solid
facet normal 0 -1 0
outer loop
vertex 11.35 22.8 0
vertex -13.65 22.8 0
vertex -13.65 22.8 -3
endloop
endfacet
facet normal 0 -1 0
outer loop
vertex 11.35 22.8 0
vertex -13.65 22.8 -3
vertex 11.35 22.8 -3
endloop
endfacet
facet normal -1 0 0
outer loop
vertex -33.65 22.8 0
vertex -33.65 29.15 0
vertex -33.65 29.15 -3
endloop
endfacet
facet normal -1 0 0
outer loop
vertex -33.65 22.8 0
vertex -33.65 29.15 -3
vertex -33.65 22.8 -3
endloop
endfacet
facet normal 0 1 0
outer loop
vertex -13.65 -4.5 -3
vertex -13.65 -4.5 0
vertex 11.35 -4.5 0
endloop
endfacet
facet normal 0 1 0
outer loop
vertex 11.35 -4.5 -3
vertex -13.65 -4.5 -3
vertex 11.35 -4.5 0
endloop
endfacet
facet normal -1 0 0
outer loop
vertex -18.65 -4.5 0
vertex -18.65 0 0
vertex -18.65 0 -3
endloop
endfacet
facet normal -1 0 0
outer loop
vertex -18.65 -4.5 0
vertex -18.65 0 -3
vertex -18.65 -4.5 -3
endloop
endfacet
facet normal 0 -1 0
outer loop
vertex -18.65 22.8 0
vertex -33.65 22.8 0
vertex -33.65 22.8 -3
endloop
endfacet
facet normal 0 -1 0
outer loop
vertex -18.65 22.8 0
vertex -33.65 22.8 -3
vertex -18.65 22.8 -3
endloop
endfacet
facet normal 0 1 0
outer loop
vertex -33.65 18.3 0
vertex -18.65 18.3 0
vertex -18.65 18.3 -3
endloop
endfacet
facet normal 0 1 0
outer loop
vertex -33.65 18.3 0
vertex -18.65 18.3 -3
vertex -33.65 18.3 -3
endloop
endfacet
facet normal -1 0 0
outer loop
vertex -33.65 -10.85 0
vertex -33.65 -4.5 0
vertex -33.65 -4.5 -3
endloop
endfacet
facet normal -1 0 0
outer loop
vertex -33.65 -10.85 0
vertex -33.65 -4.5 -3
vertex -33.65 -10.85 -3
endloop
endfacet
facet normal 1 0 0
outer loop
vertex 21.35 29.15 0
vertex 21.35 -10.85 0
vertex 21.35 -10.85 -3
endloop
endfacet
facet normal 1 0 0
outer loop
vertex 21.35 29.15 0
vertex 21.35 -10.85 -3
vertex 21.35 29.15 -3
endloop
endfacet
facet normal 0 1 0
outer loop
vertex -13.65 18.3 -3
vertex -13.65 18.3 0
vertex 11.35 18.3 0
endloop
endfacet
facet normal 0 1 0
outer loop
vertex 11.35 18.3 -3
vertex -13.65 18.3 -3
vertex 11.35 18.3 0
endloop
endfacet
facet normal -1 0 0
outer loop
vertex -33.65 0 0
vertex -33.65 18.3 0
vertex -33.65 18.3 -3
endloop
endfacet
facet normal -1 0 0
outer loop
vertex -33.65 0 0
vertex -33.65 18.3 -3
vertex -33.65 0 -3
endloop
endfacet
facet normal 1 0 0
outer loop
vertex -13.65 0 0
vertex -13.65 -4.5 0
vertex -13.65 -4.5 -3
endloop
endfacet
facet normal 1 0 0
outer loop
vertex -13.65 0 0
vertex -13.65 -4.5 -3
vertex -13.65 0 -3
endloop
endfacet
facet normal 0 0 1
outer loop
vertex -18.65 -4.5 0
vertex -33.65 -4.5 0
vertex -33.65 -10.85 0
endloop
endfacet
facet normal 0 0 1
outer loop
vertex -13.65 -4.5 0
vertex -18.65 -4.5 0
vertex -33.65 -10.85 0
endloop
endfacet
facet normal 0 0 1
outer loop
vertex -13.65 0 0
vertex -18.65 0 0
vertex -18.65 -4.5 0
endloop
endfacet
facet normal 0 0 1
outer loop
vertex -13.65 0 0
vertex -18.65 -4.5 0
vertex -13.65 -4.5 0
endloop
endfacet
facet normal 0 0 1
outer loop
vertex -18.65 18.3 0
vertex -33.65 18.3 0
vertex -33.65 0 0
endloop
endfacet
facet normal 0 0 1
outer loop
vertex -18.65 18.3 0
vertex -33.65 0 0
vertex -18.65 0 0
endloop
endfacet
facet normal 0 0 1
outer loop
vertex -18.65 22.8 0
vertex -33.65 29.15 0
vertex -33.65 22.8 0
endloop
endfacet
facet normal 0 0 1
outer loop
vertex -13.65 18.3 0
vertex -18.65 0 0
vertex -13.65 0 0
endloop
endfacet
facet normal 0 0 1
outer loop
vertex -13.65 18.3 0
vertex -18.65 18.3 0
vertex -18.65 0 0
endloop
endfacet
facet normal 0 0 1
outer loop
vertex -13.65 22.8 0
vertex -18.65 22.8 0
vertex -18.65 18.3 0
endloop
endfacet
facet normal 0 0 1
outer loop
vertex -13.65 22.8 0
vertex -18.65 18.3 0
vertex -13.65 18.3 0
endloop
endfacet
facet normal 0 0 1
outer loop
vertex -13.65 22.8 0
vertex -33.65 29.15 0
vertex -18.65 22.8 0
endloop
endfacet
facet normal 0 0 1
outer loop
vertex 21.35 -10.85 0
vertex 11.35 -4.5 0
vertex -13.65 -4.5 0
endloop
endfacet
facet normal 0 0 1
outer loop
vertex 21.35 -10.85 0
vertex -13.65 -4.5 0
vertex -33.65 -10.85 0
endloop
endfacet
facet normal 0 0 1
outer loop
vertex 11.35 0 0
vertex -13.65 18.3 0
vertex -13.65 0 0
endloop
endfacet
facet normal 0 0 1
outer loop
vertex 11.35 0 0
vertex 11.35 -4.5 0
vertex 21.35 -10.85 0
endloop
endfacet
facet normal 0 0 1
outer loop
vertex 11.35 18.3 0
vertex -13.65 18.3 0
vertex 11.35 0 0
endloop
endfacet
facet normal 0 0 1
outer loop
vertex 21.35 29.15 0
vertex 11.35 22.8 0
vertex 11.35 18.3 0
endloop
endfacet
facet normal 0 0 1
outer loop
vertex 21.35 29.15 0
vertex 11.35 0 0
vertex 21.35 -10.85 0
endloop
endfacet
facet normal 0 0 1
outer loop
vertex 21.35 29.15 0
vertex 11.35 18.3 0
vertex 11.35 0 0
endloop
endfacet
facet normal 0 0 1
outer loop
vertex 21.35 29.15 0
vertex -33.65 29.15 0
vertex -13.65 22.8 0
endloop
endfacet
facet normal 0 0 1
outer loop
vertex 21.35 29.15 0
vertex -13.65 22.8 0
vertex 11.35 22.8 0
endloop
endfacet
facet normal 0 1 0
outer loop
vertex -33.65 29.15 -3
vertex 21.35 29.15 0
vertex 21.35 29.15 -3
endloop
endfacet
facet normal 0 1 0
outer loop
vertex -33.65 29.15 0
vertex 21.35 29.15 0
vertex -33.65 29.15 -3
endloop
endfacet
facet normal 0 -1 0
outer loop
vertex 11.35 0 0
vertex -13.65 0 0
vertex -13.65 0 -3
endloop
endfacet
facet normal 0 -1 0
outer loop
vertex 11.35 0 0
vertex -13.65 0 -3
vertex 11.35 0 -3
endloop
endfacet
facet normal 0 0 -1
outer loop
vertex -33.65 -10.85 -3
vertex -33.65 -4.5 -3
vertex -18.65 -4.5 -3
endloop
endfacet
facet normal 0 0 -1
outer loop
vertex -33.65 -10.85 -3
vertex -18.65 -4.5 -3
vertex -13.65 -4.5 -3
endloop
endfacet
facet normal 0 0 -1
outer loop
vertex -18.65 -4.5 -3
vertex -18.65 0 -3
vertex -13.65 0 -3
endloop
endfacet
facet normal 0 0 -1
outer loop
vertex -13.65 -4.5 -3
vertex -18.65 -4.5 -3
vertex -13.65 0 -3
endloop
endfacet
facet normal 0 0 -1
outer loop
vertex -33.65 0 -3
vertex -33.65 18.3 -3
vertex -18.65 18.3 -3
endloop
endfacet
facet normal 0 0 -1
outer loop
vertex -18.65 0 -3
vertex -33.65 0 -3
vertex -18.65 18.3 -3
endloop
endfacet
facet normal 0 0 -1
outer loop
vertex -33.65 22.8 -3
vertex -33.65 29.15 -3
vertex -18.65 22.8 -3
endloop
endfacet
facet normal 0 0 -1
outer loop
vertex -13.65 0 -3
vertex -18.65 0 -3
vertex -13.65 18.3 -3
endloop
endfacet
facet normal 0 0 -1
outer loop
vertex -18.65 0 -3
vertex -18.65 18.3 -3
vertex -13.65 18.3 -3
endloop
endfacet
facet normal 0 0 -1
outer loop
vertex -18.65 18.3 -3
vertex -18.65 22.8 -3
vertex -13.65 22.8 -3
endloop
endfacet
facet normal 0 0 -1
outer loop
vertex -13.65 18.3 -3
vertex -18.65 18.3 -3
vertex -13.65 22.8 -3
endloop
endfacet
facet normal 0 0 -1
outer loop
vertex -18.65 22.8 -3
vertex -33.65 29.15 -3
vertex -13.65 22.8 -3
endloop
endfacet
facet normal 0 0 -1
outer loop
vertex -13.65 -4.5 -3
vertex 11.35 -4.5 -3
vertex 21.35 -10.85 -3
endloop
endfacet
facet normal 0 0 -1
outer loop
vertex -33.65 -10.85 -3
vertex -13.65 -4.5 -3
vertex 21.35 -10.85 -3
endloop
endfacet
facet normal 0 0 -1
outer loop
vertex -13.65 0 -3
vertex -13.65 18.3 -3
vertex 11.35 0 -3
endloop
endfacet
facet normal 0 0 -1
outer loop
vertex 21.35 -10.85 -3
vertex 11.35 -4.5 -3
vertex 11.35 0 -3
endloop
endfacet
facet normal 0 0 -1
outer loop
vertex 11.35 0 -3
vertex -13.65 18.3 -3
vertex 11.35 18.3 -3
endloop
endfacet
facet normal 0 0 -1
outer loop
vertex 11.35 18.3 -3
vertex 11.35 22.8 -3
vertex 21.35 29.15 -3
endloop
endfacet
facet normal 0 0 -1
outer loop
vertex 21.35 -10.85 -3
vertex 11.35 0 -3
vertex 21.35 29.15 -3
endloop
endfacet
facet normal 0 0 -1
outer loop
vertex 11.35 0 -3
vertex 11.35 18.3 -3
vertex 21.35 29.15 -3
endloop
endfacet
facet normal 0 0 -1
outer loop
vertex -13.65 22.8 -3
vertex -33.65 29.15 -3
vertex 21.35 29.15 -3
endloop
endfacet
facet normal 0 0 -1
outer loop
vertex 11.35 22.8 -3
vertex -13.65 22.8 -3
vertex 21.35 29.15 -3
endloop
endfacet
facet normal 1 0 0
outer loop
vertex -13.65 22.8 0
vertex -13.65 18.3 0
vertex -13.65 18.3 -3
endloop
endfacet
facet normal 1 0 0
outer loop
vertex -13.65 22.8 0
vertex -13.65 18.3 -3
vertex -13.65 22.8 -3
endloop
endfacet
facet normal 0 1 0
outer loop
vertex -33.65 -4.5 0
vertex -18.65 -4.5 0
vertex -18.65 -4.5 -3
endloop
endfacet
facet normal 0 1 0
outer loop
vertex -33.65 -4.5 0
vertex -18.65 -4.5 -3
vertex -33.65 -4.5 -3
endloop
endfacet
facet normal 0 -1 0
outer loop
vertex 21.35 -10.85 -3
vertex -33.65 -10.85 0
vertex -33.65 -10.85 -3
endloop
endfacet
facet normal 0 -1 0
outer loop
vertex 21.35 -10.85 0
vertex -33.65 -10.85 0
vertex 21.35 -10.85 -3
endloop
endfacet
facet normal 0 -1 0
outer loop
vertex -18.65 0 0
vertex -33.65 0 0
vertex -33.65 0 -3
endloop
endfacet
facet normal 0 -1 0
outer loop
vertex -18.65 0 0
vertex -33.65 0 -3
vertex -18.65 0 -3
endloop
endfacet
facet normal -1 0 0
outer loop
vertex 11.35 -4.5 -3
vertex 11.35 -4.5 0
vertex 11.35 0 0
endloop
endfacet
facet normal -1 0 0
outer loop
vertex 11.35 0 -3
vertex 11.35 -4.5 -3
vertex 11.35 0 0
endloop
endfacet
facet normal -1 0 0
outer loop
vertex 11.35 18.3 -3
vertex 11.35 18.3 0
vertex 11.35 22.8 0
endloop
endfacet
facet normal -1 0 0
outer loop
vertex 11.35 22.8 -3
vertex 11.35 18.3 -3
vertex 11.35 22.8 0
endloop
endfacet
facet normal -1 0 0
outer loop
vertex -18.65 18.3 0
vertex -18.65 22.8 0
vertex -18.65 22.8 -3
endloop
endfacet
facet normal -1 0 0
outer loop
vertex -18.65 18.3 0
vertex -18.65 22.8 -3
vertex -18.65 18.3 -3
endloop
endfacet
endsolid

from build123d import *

# Parameters (mm, degrees)
SKETCH1_W           = 25
SKETCH1_H           = 4.5
BOSS_EXTRUDE1_DEPTH = 3


with BuildPart() as part:
    # Sketch1 → Boss-Extrude1 (new body)
    with BuildSketch(Plane.XY):
        Polygon((-33.65, -10.85), (21.35, -10.85), (21.35, 29.15), (-33.65, 29.15), (-33.65, 22.8), (-18.65, 22.8), (-18.65, 18.3), (-33.65, 18.3), (-33.65, 0), (-18.65, 0), (-18.65, -4.5), (-33.65, -4.5), align=None)
        with Locations((-1.15, -2.25)):
            Rectangle(SKETCH1_W, SKETCH1_H, mode=Mode.SUBTRACT)
        with Locations((-1.15, 20.55)):
            Rectangle(SKETCH1_W, SKETCH1_H, mode=Mode.SUBTRACT)
    extrude(amount=-BOSS_EXTRUDE1_DEPTH)


solid = part.part
